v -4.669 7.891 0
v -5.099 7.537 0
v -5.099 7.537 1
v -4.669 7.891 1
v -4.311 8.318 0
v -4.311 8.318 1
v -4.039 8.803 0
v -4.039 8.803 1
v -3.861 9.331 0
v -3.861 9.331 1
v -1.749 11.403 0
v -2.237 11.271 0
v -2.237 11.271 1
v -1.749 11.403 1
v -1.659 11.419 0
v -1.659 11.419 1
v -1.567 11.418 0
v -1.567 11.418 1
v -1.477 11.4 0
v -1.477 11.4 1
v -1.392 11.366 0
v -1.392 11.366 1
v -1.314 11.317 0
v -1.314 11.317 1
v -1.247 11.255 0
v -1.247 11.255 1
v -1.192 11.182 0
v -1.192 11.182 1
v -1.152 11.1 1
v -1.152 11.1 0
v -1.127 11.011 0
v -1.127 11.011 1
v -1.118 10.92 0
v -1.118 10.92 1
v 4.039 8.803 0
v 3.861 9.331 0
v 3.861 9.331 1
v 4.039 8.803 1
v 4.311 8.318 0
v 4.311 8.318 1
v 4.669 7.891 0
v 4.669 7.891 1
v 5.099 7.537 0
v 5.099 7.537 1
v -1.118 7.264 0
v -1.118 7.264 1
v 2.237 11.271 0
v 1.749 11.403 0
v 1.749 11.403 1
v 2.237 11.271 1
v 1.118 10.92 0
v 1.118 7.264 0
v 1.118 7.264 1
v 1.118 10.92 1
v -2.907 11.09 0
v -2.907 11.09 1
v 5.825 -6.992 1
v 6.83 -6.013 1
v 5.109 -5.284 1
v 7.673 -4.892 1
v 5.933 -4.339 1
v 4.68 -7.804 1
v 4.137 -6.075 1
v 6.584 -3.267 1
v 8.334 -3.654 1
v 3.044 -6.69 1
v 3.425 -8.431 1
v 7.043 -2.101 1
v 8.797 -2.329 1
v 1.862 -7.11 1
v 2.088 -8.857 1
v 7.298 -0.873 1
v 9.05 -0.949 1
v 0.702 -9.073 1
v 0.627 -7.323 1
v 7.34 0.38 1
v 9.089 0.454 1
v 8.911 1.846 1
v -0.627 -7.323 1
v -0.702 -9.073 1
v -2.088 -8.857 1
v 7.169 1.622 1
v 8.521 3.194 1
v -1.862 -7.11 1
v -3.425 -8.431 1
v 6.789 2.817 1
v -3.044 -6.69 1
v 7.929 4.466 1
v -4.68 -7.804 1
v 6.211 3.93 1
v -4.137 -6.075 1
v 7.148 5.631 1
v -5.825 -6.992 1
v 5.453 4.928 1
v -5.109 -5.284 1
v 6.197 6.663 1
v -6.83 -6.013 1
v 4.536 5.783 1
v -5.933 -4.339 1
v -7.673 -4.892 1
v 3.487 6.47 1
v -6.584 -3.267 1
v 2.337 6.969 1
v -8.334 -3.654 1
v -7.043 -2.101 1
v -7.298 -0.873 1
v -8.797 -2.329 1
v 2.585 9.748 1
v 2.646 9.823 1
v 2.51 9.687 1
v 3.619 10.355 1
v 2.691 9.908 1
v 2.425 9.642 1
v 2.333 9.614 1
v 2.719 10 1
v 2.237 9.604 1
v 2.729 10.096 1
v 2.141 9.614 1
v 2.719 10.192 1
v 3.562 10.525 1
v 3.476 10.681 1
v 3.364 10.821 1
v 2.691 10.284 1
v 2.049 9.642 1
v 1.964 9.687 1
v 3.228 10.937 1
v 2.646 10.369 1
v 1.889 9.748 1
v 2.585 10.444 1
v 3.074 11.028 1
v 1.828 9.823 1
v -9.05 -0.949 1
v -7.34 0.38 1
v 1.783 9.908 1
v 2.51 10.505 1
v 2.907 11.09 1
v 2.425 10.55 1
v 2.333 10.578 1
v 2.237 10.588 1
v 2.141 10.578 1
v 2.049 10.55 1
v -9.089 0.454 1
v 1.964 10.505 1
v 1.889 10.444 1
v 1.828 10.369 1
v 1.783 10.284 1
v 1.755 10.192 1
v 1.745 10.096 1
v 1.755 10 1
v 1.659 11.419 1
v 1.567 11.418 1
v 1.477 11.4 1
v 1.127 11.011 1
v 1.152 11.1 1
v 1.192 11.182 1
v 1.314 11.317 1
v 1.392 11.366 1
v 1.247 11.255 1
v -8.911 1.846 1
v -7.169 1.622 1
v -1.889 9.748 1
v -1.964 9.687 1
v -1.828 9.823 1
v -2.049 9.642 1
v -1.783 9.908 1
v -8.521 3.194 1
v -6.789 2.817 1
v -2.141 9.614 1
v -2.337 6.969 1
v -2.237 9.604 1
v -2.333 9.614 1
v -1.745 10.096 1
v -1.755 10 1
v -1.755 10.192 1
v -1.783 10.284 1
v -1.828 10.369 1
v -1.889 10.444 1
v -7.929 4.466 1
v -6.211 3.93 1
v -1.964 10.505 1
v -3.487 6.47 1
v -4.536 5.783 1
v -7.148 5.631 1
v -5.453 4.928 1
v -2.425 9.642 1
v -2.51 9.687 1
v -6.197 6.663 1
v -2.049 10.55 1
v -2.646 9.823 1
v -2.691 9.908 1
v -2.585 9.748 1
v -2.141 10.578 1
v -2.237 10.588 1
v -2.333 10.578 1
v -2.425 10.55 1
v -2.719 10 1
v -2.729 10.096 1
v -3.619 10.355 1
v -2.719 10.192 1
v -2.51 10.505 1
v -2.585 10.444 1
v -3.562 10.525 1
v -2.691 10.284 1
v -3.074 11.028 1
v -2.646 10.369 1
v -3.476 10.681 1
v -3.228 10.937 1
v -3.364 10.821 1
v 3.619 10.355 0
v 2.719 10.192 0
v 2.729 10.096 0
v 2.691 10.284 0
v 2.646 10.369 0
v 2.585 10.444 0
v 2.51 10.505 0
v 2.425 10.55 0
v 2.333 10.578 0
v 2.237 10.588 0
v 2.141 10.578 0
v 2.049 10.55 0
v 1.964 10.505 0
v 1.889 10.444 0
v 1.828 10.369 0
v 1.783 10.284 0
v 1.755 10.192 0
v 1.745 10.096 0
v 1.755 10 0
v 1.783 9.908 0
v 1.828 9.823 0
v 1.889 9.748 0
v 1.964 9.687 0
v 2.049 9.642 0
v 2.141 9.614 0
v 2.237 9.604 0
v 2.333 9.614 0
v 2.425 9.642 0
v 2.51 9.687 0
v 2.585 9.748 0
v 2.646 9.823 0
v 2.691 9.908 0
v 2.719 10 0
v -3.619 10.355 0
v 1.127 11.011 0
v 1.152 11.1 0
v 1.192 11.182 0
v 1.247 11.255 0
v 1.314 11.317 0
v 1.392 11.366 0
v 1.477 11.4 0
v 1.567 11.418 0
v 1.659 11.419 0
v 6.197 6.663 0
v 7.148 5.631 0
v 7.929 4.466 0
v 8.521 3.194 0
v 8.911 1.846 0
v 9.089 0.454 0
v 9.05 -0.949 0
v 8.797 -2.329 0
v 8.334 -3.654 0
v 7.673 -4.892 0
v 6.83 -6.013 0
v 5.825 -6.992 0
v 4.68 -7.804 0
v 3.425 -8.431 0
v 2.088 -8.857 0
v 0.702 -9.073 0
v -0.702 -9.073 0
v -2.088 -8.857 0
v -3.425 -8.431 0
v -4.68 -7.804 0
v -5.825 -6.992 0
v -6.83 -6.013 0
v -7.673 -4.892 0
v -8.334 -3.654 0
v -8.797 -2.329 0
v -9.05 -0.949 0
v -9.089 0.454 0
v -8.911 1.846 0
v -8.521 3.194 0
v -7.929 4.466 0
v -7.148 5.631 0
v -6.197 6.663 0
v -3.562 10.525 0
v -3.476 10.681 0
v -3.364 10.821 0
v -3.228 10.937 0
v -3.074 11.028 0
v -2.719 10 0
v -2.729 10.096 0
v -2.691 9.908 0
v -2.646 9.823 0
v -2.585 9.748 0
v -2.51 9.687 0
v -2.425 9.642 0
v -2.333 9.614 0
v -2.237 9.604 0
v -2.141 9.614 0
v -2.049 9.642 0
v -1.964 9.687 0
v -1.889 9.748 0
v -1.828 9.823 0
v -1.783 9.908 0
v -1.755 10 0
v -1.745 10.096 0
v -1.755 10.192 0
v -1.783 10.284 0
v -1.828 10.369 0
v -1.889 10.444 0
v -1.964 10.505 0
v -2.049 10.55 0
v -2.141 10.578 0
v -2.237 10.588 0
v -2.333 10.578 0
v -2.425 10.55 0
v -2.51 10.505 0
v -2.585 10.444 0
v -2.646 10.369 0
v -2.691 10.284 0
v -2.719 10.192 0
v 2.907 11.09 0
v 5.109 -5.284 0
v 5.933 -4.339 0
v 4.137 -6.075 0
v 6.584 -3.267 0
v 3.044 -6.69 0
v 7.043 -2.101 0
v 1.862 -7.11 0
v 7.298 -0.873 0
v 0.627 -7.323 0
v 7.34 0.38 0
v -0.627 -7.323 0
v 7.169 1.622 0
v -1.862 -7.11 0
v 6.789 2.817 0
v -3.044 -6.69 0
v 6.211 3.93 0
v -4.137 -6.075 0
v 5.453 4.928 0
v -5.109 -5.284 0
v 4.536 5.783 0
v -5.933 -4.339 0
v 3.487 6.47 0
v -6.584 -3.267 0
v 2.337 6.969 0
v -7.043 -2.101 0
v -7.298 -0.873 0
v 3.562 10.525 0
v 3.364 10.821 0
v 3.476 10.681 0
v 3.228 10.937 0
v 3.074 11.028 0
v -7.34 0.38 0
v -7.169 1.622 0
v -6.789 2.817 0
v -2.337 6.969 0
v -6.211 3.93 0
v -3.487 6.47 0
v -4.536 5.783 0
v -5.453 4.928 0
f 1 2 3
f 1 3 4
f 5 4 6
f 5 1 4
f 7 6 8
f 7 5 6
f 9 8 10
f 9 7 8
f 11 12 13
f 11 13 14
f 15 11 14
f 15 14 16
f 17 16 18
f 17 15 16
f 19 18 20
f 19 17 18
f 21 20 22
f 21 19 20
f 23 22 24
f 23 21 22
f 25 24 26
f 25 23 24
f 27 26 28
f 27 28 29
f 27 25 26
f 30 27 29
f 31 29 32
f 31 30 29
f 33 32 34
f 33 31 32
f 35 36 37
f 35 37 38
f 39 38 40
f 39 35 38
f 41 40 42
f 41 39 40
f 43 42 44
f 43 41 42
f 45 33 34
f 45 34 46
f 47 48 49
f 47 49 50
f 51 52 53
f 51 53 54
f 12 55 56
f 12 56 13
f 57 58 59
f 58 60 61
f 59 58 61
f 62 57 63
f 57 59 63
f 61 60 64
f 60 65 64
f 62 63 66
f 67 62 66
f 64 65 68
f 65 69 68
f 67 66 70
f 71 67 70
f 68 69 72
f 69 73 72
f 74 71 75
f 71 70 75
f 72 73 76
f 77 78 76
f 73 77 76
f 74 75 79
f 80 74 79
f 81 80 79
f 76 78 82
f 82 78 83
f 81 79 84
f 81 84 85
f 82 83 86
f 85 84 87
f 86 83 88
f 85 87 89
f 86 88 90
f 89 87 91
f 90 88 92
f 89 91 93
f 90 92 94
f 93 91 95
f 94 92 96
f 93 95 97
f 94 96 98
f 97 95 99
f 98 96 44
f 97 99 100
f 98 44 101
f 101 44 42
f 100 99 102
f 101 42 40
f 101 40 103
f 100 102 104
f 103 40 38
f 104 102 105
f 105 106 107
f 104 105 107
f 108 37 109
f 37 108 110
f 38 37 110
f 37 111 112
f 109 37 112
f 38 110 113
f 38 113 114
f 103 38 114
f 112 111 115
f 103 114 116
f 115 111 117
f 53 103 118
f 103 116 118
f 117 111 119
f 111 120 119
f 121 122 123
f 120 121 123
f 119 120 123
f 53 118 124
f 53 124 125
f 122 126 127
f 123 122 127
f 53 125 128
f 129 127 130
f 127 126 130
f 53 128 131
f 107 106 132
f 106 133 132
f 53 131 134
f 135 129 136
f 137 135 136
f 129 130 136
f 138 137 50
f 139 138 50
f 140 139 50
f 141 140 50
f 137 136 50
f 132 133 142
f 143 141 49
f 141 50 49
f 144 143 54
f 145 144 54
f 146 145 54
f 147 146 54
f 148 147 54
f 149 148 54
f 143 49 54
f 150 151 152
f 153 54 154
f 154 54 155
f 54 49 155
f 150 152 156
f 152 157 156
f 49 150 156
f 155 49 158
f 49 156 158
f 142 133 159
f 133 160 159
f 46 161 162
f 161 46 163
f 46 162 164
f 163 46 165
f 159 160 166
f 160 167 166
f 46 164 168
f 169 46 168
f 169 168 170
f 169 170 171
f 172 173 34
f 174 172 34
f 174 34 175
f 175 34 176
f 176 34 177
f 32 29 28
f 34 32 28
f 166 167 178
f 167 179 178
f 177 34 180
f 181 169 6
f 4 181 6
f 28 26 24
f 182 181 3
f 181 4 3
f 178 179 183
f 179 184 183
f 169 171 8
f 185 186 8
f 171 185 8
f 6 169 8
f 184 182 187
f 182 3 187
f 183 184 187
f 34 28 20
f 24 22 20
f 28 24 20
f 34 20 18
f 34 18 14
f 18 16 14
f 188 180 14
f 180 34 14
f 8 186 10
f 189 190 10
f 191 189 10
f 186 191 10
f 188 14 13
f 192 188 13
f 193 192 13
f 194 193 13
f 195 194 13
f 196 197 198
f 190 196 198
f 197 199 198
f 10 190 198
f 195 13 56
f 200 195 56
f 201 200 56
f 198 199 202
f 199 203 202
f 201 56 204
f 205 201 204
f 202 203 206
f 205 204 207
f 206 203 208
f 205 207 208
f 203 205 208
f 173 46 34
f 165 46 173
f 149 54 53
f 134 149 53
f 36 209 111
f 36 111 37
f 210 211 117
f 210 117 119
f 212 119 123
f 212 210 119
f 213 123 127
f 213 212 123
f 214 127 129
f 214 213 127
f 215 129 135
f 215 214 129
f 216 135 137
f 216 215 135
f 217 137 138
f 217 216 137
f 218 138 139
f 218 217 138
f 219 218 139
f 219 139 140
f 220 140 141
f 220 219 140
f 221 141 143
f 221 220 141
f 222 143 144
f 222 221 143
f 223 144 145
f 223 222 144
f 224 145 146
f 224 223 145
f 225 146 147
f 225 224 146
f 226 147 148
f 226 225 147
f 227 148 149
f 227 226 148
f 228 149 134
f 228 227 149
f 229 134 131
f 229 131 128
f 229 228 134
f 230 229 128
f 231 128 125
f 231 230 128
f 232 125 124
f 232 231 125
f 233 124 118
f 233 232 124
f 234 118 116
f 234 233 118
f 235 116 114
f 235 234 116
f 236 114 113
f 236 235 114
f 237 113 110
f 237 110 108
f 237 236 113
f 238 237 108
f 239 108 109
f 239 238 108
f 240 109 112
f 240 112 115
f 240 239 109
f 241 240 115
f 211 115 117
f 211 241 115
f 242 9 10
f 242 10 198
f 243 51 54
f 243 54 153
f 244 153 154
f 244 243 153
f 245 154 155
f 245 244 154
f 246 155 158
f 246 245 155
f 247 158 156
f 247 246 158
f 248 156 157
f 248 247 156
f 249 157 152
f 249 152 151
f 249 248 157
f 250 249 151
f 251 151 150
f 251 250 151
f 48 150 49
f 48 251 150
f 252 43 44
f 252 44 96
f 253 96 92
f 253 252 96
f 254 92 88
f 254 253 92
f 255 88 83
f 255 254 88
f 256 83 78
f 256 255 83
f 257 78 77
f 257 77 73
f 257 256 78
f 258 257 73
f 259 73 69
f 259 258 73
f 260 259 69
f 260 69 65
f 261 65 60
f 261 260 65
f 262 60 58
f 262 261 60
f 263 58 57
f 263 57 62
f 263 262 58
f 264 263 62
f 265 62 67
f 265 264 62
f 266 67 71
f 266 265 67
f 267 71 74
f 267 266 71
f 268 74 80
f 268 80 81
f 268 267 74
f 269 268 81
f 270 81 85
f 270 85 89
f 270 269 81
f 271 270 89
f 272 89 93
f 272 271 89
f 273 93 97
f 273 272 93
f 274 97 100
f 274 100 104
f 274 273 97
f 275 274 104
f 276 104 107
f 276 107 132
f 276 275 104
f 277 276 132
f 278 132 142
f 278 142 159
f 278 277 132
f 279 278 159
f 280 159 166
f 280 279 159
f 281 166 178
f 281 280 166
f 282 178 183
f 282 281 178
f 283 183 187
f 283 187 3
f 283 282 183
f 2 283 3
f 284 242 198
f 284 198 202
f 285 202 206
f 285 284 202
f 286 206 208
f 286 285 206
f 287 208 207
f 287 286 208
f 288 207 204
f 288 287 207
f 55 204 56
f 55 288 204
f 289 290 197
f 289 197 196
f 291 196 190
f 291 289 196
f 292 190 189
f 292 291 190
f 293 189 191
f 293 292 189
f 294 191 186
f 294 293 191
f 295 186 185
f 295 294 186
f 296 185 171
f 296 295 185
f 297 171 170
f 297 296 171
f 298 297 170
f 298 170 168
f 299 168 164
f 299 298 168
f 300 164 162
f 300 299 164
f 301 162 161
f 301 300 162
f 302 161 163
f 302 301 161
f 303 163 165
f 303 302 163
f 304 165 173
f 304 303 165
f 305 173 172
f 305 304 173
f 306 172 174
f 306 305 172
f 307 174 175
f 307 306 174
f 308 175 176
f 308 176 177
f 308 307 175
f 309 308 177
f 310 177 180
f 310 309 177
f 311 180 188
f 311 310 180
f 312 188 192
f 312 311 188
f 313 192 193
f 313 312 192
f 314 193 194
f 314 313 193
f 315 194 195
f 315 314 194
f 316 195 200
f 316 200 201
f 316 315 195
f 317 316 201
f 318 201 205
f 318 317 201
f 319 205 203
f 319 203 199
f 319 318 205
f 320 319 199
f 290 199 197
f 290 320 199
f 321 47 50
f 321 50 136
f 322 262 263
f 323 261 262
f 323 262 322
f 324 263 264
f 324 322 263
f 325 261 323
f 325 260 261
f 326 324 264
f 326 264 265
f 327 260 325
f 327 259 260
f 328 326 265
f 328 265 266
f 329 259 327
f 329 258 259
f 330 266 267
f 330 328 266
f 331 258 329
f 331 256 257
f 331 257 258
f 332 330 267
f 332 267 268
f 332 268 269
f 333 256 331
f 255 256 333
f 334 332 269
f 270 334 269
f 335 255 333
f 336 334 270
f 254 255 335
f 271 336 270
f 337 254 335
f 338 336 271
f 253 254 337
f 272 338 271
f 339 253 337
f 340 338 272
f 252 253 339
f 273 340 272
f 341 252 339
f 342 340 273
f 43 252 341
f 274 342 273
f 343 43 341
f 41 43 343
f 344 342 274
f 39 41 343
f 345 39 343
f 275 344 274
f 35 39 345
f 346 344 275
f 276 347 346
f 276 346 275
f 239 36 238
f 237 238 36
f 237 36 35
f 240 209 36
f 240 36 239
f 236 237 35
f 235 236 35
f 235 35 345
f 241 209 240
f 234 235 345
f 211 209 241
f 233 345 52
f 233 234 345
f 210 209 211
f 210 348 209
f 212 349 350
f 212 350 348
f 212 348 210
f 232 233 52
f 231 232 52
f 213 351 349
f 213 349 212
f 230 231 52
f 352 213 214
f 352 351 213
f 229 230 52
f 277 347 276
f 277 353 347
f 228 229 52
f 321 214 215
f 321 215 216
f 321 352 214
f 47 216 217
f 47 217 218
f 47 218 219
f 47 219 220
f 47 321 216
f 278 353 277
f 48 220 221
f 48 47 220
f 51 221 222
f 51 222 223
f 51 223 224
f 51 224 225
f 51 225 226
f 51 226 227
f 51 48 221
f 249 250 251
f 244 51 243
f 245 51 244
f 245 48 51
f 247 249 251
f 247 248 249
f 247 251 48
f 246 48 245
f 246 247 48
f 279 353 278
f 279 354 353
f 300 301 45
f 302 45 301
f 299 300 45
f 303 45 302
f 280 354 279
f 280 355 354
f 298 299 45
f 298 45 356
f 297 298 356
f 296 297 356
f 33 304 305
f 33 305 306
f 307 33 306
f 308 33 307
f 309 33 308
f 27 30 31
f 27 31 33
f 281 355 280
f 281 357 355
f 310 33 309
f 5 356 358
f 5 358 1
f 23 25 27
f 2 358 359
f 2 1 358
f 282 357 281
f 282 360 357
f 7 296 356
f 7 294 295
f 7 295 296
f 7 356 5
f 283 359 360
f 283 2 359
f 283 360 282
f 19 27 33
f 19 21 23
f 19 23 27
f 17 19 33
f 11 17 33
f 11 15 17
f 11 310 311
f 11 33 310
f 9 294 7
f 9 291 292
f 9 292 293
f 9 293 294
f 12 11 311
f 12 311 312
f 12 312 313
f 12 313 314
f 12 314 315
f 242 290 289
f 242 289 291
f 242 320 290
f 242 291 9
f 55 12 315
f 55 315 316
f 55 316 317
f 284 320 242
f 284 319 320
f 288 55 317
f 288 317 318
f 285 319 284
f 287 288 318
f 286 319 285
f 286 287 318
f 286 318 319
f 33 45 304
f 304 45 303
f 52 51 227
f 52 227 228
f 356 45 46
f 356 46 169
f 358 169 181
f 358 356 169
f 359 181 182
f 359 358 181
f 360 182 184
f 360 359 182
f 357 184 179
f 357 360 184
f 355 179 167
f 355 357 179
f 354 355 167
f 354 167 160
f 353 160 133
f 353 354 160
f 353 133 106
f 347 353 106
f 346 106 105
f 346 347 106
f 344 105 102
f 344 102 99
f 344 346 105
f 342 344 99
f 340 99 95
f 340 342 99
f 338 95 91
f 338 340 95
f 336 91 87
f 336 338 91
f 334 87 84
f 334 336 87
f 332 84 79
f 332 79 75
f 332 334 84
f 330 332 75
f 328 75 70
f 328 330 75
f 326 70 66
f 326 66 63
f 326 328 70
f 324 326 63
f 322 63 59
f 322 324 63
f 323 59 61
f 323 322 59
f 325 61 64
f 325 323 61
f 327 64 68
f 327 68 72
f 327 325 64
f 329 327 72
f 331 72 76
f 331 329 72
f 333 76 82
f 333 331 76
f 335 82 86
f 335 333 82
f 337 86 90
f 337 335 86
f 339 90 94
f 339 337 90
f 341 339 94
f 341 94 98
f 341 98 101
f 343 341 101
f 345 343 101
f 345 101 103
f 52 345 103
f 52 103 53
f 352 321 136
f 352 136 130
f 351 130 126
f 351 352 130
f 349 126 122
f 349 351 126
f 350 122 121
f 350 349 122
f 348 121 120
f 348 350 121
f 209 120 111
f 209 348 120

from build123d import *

# Parameters (mm, degrees)
SKETCH_1_R      = 0.491728838
EXTRUDE_1_DEPTH = 1


with BuildPart() as part:
    # 草图1 → 凸台-拉伸1 (new body)
    with BuildSketch(Plane.XY):
        with BuildLine():
            Line((1.748834408, 11.402867185), (2.236845371, 11.271018751))
            Line((2.236845371, 11.271018751), (2.906504263, 11.090093561))
            ThreePointArc((2.906504263, 11.090093561), (3.363858628, 10.820566678), (3.618817735, 10.354934194))
            Line((3.618817735, 10.354934194), (3.861047435, 9.33106424))
            ThreePointArc((3.861047435, 9.33106424), (4.311482707, 8.317586053), (5.09935285, 7.537015358))
            ThreePointArc((5.09935285, 7.537015358), (0, -9.1), (-5.09935285, 7.537015358))
            ThreePointArc((-5.09935285, 7.537015358), (-4.311482707, 8.317586053), (-3.861047435, 9.33106424))
            Line((-3.861047435, 9.33106424), (-3.618817735, 10.354934194))
            ThreePointArc((-3.618817735, 10.354934194), (-3.363858628, 10.820566678), (-2.906504263, 11.090093561))
            Line((-2.906504263, 11.090093561), (-2.236845371, 11.271018751))
            Line((-2.236845371, 11.271018751), (-1.748834408, 11.402867185))
            ThreePointArc((-1.748834408, 11.402867185), (-1.314453823, 11.317166281), (-1.118422685, 10.920173925))
            Line((-1.118422685, 10.920173925), (-1.118422685, 9.031009395))
            Line((-1.118422685, 9.031009395), (-1.118422685, 7.264408489))
            ThreePointArc((-1.118422685, 7.264408489), (0, -7.35), (1.118422685, 7.264408489))
            Line((1.118422685, 7.264408489), (1.118422685, 9.031009395))
            Line((1.118422685, 9.031009395), (1.118422685, 10.920173925))
            ThreePointArc((1.118422685, 10.920173925), (1.314453823, 11.317166281), (1.748834408, 11.402867185))
        make_face()
        with Locations((2.236845371, 10.095934401)):
            Circle(SKETCH_1_R, mode=Mode.SUBTRACT)
        with Locations(Location((-2.236845371, 10.095934401, 0), (0, 0, 180))):
            Circle(SKETCH_1_R, mode=Mode.SUBTRACT)
    extrude(amount=EXTRUDE_1_DEPTH)


solid = part.part
